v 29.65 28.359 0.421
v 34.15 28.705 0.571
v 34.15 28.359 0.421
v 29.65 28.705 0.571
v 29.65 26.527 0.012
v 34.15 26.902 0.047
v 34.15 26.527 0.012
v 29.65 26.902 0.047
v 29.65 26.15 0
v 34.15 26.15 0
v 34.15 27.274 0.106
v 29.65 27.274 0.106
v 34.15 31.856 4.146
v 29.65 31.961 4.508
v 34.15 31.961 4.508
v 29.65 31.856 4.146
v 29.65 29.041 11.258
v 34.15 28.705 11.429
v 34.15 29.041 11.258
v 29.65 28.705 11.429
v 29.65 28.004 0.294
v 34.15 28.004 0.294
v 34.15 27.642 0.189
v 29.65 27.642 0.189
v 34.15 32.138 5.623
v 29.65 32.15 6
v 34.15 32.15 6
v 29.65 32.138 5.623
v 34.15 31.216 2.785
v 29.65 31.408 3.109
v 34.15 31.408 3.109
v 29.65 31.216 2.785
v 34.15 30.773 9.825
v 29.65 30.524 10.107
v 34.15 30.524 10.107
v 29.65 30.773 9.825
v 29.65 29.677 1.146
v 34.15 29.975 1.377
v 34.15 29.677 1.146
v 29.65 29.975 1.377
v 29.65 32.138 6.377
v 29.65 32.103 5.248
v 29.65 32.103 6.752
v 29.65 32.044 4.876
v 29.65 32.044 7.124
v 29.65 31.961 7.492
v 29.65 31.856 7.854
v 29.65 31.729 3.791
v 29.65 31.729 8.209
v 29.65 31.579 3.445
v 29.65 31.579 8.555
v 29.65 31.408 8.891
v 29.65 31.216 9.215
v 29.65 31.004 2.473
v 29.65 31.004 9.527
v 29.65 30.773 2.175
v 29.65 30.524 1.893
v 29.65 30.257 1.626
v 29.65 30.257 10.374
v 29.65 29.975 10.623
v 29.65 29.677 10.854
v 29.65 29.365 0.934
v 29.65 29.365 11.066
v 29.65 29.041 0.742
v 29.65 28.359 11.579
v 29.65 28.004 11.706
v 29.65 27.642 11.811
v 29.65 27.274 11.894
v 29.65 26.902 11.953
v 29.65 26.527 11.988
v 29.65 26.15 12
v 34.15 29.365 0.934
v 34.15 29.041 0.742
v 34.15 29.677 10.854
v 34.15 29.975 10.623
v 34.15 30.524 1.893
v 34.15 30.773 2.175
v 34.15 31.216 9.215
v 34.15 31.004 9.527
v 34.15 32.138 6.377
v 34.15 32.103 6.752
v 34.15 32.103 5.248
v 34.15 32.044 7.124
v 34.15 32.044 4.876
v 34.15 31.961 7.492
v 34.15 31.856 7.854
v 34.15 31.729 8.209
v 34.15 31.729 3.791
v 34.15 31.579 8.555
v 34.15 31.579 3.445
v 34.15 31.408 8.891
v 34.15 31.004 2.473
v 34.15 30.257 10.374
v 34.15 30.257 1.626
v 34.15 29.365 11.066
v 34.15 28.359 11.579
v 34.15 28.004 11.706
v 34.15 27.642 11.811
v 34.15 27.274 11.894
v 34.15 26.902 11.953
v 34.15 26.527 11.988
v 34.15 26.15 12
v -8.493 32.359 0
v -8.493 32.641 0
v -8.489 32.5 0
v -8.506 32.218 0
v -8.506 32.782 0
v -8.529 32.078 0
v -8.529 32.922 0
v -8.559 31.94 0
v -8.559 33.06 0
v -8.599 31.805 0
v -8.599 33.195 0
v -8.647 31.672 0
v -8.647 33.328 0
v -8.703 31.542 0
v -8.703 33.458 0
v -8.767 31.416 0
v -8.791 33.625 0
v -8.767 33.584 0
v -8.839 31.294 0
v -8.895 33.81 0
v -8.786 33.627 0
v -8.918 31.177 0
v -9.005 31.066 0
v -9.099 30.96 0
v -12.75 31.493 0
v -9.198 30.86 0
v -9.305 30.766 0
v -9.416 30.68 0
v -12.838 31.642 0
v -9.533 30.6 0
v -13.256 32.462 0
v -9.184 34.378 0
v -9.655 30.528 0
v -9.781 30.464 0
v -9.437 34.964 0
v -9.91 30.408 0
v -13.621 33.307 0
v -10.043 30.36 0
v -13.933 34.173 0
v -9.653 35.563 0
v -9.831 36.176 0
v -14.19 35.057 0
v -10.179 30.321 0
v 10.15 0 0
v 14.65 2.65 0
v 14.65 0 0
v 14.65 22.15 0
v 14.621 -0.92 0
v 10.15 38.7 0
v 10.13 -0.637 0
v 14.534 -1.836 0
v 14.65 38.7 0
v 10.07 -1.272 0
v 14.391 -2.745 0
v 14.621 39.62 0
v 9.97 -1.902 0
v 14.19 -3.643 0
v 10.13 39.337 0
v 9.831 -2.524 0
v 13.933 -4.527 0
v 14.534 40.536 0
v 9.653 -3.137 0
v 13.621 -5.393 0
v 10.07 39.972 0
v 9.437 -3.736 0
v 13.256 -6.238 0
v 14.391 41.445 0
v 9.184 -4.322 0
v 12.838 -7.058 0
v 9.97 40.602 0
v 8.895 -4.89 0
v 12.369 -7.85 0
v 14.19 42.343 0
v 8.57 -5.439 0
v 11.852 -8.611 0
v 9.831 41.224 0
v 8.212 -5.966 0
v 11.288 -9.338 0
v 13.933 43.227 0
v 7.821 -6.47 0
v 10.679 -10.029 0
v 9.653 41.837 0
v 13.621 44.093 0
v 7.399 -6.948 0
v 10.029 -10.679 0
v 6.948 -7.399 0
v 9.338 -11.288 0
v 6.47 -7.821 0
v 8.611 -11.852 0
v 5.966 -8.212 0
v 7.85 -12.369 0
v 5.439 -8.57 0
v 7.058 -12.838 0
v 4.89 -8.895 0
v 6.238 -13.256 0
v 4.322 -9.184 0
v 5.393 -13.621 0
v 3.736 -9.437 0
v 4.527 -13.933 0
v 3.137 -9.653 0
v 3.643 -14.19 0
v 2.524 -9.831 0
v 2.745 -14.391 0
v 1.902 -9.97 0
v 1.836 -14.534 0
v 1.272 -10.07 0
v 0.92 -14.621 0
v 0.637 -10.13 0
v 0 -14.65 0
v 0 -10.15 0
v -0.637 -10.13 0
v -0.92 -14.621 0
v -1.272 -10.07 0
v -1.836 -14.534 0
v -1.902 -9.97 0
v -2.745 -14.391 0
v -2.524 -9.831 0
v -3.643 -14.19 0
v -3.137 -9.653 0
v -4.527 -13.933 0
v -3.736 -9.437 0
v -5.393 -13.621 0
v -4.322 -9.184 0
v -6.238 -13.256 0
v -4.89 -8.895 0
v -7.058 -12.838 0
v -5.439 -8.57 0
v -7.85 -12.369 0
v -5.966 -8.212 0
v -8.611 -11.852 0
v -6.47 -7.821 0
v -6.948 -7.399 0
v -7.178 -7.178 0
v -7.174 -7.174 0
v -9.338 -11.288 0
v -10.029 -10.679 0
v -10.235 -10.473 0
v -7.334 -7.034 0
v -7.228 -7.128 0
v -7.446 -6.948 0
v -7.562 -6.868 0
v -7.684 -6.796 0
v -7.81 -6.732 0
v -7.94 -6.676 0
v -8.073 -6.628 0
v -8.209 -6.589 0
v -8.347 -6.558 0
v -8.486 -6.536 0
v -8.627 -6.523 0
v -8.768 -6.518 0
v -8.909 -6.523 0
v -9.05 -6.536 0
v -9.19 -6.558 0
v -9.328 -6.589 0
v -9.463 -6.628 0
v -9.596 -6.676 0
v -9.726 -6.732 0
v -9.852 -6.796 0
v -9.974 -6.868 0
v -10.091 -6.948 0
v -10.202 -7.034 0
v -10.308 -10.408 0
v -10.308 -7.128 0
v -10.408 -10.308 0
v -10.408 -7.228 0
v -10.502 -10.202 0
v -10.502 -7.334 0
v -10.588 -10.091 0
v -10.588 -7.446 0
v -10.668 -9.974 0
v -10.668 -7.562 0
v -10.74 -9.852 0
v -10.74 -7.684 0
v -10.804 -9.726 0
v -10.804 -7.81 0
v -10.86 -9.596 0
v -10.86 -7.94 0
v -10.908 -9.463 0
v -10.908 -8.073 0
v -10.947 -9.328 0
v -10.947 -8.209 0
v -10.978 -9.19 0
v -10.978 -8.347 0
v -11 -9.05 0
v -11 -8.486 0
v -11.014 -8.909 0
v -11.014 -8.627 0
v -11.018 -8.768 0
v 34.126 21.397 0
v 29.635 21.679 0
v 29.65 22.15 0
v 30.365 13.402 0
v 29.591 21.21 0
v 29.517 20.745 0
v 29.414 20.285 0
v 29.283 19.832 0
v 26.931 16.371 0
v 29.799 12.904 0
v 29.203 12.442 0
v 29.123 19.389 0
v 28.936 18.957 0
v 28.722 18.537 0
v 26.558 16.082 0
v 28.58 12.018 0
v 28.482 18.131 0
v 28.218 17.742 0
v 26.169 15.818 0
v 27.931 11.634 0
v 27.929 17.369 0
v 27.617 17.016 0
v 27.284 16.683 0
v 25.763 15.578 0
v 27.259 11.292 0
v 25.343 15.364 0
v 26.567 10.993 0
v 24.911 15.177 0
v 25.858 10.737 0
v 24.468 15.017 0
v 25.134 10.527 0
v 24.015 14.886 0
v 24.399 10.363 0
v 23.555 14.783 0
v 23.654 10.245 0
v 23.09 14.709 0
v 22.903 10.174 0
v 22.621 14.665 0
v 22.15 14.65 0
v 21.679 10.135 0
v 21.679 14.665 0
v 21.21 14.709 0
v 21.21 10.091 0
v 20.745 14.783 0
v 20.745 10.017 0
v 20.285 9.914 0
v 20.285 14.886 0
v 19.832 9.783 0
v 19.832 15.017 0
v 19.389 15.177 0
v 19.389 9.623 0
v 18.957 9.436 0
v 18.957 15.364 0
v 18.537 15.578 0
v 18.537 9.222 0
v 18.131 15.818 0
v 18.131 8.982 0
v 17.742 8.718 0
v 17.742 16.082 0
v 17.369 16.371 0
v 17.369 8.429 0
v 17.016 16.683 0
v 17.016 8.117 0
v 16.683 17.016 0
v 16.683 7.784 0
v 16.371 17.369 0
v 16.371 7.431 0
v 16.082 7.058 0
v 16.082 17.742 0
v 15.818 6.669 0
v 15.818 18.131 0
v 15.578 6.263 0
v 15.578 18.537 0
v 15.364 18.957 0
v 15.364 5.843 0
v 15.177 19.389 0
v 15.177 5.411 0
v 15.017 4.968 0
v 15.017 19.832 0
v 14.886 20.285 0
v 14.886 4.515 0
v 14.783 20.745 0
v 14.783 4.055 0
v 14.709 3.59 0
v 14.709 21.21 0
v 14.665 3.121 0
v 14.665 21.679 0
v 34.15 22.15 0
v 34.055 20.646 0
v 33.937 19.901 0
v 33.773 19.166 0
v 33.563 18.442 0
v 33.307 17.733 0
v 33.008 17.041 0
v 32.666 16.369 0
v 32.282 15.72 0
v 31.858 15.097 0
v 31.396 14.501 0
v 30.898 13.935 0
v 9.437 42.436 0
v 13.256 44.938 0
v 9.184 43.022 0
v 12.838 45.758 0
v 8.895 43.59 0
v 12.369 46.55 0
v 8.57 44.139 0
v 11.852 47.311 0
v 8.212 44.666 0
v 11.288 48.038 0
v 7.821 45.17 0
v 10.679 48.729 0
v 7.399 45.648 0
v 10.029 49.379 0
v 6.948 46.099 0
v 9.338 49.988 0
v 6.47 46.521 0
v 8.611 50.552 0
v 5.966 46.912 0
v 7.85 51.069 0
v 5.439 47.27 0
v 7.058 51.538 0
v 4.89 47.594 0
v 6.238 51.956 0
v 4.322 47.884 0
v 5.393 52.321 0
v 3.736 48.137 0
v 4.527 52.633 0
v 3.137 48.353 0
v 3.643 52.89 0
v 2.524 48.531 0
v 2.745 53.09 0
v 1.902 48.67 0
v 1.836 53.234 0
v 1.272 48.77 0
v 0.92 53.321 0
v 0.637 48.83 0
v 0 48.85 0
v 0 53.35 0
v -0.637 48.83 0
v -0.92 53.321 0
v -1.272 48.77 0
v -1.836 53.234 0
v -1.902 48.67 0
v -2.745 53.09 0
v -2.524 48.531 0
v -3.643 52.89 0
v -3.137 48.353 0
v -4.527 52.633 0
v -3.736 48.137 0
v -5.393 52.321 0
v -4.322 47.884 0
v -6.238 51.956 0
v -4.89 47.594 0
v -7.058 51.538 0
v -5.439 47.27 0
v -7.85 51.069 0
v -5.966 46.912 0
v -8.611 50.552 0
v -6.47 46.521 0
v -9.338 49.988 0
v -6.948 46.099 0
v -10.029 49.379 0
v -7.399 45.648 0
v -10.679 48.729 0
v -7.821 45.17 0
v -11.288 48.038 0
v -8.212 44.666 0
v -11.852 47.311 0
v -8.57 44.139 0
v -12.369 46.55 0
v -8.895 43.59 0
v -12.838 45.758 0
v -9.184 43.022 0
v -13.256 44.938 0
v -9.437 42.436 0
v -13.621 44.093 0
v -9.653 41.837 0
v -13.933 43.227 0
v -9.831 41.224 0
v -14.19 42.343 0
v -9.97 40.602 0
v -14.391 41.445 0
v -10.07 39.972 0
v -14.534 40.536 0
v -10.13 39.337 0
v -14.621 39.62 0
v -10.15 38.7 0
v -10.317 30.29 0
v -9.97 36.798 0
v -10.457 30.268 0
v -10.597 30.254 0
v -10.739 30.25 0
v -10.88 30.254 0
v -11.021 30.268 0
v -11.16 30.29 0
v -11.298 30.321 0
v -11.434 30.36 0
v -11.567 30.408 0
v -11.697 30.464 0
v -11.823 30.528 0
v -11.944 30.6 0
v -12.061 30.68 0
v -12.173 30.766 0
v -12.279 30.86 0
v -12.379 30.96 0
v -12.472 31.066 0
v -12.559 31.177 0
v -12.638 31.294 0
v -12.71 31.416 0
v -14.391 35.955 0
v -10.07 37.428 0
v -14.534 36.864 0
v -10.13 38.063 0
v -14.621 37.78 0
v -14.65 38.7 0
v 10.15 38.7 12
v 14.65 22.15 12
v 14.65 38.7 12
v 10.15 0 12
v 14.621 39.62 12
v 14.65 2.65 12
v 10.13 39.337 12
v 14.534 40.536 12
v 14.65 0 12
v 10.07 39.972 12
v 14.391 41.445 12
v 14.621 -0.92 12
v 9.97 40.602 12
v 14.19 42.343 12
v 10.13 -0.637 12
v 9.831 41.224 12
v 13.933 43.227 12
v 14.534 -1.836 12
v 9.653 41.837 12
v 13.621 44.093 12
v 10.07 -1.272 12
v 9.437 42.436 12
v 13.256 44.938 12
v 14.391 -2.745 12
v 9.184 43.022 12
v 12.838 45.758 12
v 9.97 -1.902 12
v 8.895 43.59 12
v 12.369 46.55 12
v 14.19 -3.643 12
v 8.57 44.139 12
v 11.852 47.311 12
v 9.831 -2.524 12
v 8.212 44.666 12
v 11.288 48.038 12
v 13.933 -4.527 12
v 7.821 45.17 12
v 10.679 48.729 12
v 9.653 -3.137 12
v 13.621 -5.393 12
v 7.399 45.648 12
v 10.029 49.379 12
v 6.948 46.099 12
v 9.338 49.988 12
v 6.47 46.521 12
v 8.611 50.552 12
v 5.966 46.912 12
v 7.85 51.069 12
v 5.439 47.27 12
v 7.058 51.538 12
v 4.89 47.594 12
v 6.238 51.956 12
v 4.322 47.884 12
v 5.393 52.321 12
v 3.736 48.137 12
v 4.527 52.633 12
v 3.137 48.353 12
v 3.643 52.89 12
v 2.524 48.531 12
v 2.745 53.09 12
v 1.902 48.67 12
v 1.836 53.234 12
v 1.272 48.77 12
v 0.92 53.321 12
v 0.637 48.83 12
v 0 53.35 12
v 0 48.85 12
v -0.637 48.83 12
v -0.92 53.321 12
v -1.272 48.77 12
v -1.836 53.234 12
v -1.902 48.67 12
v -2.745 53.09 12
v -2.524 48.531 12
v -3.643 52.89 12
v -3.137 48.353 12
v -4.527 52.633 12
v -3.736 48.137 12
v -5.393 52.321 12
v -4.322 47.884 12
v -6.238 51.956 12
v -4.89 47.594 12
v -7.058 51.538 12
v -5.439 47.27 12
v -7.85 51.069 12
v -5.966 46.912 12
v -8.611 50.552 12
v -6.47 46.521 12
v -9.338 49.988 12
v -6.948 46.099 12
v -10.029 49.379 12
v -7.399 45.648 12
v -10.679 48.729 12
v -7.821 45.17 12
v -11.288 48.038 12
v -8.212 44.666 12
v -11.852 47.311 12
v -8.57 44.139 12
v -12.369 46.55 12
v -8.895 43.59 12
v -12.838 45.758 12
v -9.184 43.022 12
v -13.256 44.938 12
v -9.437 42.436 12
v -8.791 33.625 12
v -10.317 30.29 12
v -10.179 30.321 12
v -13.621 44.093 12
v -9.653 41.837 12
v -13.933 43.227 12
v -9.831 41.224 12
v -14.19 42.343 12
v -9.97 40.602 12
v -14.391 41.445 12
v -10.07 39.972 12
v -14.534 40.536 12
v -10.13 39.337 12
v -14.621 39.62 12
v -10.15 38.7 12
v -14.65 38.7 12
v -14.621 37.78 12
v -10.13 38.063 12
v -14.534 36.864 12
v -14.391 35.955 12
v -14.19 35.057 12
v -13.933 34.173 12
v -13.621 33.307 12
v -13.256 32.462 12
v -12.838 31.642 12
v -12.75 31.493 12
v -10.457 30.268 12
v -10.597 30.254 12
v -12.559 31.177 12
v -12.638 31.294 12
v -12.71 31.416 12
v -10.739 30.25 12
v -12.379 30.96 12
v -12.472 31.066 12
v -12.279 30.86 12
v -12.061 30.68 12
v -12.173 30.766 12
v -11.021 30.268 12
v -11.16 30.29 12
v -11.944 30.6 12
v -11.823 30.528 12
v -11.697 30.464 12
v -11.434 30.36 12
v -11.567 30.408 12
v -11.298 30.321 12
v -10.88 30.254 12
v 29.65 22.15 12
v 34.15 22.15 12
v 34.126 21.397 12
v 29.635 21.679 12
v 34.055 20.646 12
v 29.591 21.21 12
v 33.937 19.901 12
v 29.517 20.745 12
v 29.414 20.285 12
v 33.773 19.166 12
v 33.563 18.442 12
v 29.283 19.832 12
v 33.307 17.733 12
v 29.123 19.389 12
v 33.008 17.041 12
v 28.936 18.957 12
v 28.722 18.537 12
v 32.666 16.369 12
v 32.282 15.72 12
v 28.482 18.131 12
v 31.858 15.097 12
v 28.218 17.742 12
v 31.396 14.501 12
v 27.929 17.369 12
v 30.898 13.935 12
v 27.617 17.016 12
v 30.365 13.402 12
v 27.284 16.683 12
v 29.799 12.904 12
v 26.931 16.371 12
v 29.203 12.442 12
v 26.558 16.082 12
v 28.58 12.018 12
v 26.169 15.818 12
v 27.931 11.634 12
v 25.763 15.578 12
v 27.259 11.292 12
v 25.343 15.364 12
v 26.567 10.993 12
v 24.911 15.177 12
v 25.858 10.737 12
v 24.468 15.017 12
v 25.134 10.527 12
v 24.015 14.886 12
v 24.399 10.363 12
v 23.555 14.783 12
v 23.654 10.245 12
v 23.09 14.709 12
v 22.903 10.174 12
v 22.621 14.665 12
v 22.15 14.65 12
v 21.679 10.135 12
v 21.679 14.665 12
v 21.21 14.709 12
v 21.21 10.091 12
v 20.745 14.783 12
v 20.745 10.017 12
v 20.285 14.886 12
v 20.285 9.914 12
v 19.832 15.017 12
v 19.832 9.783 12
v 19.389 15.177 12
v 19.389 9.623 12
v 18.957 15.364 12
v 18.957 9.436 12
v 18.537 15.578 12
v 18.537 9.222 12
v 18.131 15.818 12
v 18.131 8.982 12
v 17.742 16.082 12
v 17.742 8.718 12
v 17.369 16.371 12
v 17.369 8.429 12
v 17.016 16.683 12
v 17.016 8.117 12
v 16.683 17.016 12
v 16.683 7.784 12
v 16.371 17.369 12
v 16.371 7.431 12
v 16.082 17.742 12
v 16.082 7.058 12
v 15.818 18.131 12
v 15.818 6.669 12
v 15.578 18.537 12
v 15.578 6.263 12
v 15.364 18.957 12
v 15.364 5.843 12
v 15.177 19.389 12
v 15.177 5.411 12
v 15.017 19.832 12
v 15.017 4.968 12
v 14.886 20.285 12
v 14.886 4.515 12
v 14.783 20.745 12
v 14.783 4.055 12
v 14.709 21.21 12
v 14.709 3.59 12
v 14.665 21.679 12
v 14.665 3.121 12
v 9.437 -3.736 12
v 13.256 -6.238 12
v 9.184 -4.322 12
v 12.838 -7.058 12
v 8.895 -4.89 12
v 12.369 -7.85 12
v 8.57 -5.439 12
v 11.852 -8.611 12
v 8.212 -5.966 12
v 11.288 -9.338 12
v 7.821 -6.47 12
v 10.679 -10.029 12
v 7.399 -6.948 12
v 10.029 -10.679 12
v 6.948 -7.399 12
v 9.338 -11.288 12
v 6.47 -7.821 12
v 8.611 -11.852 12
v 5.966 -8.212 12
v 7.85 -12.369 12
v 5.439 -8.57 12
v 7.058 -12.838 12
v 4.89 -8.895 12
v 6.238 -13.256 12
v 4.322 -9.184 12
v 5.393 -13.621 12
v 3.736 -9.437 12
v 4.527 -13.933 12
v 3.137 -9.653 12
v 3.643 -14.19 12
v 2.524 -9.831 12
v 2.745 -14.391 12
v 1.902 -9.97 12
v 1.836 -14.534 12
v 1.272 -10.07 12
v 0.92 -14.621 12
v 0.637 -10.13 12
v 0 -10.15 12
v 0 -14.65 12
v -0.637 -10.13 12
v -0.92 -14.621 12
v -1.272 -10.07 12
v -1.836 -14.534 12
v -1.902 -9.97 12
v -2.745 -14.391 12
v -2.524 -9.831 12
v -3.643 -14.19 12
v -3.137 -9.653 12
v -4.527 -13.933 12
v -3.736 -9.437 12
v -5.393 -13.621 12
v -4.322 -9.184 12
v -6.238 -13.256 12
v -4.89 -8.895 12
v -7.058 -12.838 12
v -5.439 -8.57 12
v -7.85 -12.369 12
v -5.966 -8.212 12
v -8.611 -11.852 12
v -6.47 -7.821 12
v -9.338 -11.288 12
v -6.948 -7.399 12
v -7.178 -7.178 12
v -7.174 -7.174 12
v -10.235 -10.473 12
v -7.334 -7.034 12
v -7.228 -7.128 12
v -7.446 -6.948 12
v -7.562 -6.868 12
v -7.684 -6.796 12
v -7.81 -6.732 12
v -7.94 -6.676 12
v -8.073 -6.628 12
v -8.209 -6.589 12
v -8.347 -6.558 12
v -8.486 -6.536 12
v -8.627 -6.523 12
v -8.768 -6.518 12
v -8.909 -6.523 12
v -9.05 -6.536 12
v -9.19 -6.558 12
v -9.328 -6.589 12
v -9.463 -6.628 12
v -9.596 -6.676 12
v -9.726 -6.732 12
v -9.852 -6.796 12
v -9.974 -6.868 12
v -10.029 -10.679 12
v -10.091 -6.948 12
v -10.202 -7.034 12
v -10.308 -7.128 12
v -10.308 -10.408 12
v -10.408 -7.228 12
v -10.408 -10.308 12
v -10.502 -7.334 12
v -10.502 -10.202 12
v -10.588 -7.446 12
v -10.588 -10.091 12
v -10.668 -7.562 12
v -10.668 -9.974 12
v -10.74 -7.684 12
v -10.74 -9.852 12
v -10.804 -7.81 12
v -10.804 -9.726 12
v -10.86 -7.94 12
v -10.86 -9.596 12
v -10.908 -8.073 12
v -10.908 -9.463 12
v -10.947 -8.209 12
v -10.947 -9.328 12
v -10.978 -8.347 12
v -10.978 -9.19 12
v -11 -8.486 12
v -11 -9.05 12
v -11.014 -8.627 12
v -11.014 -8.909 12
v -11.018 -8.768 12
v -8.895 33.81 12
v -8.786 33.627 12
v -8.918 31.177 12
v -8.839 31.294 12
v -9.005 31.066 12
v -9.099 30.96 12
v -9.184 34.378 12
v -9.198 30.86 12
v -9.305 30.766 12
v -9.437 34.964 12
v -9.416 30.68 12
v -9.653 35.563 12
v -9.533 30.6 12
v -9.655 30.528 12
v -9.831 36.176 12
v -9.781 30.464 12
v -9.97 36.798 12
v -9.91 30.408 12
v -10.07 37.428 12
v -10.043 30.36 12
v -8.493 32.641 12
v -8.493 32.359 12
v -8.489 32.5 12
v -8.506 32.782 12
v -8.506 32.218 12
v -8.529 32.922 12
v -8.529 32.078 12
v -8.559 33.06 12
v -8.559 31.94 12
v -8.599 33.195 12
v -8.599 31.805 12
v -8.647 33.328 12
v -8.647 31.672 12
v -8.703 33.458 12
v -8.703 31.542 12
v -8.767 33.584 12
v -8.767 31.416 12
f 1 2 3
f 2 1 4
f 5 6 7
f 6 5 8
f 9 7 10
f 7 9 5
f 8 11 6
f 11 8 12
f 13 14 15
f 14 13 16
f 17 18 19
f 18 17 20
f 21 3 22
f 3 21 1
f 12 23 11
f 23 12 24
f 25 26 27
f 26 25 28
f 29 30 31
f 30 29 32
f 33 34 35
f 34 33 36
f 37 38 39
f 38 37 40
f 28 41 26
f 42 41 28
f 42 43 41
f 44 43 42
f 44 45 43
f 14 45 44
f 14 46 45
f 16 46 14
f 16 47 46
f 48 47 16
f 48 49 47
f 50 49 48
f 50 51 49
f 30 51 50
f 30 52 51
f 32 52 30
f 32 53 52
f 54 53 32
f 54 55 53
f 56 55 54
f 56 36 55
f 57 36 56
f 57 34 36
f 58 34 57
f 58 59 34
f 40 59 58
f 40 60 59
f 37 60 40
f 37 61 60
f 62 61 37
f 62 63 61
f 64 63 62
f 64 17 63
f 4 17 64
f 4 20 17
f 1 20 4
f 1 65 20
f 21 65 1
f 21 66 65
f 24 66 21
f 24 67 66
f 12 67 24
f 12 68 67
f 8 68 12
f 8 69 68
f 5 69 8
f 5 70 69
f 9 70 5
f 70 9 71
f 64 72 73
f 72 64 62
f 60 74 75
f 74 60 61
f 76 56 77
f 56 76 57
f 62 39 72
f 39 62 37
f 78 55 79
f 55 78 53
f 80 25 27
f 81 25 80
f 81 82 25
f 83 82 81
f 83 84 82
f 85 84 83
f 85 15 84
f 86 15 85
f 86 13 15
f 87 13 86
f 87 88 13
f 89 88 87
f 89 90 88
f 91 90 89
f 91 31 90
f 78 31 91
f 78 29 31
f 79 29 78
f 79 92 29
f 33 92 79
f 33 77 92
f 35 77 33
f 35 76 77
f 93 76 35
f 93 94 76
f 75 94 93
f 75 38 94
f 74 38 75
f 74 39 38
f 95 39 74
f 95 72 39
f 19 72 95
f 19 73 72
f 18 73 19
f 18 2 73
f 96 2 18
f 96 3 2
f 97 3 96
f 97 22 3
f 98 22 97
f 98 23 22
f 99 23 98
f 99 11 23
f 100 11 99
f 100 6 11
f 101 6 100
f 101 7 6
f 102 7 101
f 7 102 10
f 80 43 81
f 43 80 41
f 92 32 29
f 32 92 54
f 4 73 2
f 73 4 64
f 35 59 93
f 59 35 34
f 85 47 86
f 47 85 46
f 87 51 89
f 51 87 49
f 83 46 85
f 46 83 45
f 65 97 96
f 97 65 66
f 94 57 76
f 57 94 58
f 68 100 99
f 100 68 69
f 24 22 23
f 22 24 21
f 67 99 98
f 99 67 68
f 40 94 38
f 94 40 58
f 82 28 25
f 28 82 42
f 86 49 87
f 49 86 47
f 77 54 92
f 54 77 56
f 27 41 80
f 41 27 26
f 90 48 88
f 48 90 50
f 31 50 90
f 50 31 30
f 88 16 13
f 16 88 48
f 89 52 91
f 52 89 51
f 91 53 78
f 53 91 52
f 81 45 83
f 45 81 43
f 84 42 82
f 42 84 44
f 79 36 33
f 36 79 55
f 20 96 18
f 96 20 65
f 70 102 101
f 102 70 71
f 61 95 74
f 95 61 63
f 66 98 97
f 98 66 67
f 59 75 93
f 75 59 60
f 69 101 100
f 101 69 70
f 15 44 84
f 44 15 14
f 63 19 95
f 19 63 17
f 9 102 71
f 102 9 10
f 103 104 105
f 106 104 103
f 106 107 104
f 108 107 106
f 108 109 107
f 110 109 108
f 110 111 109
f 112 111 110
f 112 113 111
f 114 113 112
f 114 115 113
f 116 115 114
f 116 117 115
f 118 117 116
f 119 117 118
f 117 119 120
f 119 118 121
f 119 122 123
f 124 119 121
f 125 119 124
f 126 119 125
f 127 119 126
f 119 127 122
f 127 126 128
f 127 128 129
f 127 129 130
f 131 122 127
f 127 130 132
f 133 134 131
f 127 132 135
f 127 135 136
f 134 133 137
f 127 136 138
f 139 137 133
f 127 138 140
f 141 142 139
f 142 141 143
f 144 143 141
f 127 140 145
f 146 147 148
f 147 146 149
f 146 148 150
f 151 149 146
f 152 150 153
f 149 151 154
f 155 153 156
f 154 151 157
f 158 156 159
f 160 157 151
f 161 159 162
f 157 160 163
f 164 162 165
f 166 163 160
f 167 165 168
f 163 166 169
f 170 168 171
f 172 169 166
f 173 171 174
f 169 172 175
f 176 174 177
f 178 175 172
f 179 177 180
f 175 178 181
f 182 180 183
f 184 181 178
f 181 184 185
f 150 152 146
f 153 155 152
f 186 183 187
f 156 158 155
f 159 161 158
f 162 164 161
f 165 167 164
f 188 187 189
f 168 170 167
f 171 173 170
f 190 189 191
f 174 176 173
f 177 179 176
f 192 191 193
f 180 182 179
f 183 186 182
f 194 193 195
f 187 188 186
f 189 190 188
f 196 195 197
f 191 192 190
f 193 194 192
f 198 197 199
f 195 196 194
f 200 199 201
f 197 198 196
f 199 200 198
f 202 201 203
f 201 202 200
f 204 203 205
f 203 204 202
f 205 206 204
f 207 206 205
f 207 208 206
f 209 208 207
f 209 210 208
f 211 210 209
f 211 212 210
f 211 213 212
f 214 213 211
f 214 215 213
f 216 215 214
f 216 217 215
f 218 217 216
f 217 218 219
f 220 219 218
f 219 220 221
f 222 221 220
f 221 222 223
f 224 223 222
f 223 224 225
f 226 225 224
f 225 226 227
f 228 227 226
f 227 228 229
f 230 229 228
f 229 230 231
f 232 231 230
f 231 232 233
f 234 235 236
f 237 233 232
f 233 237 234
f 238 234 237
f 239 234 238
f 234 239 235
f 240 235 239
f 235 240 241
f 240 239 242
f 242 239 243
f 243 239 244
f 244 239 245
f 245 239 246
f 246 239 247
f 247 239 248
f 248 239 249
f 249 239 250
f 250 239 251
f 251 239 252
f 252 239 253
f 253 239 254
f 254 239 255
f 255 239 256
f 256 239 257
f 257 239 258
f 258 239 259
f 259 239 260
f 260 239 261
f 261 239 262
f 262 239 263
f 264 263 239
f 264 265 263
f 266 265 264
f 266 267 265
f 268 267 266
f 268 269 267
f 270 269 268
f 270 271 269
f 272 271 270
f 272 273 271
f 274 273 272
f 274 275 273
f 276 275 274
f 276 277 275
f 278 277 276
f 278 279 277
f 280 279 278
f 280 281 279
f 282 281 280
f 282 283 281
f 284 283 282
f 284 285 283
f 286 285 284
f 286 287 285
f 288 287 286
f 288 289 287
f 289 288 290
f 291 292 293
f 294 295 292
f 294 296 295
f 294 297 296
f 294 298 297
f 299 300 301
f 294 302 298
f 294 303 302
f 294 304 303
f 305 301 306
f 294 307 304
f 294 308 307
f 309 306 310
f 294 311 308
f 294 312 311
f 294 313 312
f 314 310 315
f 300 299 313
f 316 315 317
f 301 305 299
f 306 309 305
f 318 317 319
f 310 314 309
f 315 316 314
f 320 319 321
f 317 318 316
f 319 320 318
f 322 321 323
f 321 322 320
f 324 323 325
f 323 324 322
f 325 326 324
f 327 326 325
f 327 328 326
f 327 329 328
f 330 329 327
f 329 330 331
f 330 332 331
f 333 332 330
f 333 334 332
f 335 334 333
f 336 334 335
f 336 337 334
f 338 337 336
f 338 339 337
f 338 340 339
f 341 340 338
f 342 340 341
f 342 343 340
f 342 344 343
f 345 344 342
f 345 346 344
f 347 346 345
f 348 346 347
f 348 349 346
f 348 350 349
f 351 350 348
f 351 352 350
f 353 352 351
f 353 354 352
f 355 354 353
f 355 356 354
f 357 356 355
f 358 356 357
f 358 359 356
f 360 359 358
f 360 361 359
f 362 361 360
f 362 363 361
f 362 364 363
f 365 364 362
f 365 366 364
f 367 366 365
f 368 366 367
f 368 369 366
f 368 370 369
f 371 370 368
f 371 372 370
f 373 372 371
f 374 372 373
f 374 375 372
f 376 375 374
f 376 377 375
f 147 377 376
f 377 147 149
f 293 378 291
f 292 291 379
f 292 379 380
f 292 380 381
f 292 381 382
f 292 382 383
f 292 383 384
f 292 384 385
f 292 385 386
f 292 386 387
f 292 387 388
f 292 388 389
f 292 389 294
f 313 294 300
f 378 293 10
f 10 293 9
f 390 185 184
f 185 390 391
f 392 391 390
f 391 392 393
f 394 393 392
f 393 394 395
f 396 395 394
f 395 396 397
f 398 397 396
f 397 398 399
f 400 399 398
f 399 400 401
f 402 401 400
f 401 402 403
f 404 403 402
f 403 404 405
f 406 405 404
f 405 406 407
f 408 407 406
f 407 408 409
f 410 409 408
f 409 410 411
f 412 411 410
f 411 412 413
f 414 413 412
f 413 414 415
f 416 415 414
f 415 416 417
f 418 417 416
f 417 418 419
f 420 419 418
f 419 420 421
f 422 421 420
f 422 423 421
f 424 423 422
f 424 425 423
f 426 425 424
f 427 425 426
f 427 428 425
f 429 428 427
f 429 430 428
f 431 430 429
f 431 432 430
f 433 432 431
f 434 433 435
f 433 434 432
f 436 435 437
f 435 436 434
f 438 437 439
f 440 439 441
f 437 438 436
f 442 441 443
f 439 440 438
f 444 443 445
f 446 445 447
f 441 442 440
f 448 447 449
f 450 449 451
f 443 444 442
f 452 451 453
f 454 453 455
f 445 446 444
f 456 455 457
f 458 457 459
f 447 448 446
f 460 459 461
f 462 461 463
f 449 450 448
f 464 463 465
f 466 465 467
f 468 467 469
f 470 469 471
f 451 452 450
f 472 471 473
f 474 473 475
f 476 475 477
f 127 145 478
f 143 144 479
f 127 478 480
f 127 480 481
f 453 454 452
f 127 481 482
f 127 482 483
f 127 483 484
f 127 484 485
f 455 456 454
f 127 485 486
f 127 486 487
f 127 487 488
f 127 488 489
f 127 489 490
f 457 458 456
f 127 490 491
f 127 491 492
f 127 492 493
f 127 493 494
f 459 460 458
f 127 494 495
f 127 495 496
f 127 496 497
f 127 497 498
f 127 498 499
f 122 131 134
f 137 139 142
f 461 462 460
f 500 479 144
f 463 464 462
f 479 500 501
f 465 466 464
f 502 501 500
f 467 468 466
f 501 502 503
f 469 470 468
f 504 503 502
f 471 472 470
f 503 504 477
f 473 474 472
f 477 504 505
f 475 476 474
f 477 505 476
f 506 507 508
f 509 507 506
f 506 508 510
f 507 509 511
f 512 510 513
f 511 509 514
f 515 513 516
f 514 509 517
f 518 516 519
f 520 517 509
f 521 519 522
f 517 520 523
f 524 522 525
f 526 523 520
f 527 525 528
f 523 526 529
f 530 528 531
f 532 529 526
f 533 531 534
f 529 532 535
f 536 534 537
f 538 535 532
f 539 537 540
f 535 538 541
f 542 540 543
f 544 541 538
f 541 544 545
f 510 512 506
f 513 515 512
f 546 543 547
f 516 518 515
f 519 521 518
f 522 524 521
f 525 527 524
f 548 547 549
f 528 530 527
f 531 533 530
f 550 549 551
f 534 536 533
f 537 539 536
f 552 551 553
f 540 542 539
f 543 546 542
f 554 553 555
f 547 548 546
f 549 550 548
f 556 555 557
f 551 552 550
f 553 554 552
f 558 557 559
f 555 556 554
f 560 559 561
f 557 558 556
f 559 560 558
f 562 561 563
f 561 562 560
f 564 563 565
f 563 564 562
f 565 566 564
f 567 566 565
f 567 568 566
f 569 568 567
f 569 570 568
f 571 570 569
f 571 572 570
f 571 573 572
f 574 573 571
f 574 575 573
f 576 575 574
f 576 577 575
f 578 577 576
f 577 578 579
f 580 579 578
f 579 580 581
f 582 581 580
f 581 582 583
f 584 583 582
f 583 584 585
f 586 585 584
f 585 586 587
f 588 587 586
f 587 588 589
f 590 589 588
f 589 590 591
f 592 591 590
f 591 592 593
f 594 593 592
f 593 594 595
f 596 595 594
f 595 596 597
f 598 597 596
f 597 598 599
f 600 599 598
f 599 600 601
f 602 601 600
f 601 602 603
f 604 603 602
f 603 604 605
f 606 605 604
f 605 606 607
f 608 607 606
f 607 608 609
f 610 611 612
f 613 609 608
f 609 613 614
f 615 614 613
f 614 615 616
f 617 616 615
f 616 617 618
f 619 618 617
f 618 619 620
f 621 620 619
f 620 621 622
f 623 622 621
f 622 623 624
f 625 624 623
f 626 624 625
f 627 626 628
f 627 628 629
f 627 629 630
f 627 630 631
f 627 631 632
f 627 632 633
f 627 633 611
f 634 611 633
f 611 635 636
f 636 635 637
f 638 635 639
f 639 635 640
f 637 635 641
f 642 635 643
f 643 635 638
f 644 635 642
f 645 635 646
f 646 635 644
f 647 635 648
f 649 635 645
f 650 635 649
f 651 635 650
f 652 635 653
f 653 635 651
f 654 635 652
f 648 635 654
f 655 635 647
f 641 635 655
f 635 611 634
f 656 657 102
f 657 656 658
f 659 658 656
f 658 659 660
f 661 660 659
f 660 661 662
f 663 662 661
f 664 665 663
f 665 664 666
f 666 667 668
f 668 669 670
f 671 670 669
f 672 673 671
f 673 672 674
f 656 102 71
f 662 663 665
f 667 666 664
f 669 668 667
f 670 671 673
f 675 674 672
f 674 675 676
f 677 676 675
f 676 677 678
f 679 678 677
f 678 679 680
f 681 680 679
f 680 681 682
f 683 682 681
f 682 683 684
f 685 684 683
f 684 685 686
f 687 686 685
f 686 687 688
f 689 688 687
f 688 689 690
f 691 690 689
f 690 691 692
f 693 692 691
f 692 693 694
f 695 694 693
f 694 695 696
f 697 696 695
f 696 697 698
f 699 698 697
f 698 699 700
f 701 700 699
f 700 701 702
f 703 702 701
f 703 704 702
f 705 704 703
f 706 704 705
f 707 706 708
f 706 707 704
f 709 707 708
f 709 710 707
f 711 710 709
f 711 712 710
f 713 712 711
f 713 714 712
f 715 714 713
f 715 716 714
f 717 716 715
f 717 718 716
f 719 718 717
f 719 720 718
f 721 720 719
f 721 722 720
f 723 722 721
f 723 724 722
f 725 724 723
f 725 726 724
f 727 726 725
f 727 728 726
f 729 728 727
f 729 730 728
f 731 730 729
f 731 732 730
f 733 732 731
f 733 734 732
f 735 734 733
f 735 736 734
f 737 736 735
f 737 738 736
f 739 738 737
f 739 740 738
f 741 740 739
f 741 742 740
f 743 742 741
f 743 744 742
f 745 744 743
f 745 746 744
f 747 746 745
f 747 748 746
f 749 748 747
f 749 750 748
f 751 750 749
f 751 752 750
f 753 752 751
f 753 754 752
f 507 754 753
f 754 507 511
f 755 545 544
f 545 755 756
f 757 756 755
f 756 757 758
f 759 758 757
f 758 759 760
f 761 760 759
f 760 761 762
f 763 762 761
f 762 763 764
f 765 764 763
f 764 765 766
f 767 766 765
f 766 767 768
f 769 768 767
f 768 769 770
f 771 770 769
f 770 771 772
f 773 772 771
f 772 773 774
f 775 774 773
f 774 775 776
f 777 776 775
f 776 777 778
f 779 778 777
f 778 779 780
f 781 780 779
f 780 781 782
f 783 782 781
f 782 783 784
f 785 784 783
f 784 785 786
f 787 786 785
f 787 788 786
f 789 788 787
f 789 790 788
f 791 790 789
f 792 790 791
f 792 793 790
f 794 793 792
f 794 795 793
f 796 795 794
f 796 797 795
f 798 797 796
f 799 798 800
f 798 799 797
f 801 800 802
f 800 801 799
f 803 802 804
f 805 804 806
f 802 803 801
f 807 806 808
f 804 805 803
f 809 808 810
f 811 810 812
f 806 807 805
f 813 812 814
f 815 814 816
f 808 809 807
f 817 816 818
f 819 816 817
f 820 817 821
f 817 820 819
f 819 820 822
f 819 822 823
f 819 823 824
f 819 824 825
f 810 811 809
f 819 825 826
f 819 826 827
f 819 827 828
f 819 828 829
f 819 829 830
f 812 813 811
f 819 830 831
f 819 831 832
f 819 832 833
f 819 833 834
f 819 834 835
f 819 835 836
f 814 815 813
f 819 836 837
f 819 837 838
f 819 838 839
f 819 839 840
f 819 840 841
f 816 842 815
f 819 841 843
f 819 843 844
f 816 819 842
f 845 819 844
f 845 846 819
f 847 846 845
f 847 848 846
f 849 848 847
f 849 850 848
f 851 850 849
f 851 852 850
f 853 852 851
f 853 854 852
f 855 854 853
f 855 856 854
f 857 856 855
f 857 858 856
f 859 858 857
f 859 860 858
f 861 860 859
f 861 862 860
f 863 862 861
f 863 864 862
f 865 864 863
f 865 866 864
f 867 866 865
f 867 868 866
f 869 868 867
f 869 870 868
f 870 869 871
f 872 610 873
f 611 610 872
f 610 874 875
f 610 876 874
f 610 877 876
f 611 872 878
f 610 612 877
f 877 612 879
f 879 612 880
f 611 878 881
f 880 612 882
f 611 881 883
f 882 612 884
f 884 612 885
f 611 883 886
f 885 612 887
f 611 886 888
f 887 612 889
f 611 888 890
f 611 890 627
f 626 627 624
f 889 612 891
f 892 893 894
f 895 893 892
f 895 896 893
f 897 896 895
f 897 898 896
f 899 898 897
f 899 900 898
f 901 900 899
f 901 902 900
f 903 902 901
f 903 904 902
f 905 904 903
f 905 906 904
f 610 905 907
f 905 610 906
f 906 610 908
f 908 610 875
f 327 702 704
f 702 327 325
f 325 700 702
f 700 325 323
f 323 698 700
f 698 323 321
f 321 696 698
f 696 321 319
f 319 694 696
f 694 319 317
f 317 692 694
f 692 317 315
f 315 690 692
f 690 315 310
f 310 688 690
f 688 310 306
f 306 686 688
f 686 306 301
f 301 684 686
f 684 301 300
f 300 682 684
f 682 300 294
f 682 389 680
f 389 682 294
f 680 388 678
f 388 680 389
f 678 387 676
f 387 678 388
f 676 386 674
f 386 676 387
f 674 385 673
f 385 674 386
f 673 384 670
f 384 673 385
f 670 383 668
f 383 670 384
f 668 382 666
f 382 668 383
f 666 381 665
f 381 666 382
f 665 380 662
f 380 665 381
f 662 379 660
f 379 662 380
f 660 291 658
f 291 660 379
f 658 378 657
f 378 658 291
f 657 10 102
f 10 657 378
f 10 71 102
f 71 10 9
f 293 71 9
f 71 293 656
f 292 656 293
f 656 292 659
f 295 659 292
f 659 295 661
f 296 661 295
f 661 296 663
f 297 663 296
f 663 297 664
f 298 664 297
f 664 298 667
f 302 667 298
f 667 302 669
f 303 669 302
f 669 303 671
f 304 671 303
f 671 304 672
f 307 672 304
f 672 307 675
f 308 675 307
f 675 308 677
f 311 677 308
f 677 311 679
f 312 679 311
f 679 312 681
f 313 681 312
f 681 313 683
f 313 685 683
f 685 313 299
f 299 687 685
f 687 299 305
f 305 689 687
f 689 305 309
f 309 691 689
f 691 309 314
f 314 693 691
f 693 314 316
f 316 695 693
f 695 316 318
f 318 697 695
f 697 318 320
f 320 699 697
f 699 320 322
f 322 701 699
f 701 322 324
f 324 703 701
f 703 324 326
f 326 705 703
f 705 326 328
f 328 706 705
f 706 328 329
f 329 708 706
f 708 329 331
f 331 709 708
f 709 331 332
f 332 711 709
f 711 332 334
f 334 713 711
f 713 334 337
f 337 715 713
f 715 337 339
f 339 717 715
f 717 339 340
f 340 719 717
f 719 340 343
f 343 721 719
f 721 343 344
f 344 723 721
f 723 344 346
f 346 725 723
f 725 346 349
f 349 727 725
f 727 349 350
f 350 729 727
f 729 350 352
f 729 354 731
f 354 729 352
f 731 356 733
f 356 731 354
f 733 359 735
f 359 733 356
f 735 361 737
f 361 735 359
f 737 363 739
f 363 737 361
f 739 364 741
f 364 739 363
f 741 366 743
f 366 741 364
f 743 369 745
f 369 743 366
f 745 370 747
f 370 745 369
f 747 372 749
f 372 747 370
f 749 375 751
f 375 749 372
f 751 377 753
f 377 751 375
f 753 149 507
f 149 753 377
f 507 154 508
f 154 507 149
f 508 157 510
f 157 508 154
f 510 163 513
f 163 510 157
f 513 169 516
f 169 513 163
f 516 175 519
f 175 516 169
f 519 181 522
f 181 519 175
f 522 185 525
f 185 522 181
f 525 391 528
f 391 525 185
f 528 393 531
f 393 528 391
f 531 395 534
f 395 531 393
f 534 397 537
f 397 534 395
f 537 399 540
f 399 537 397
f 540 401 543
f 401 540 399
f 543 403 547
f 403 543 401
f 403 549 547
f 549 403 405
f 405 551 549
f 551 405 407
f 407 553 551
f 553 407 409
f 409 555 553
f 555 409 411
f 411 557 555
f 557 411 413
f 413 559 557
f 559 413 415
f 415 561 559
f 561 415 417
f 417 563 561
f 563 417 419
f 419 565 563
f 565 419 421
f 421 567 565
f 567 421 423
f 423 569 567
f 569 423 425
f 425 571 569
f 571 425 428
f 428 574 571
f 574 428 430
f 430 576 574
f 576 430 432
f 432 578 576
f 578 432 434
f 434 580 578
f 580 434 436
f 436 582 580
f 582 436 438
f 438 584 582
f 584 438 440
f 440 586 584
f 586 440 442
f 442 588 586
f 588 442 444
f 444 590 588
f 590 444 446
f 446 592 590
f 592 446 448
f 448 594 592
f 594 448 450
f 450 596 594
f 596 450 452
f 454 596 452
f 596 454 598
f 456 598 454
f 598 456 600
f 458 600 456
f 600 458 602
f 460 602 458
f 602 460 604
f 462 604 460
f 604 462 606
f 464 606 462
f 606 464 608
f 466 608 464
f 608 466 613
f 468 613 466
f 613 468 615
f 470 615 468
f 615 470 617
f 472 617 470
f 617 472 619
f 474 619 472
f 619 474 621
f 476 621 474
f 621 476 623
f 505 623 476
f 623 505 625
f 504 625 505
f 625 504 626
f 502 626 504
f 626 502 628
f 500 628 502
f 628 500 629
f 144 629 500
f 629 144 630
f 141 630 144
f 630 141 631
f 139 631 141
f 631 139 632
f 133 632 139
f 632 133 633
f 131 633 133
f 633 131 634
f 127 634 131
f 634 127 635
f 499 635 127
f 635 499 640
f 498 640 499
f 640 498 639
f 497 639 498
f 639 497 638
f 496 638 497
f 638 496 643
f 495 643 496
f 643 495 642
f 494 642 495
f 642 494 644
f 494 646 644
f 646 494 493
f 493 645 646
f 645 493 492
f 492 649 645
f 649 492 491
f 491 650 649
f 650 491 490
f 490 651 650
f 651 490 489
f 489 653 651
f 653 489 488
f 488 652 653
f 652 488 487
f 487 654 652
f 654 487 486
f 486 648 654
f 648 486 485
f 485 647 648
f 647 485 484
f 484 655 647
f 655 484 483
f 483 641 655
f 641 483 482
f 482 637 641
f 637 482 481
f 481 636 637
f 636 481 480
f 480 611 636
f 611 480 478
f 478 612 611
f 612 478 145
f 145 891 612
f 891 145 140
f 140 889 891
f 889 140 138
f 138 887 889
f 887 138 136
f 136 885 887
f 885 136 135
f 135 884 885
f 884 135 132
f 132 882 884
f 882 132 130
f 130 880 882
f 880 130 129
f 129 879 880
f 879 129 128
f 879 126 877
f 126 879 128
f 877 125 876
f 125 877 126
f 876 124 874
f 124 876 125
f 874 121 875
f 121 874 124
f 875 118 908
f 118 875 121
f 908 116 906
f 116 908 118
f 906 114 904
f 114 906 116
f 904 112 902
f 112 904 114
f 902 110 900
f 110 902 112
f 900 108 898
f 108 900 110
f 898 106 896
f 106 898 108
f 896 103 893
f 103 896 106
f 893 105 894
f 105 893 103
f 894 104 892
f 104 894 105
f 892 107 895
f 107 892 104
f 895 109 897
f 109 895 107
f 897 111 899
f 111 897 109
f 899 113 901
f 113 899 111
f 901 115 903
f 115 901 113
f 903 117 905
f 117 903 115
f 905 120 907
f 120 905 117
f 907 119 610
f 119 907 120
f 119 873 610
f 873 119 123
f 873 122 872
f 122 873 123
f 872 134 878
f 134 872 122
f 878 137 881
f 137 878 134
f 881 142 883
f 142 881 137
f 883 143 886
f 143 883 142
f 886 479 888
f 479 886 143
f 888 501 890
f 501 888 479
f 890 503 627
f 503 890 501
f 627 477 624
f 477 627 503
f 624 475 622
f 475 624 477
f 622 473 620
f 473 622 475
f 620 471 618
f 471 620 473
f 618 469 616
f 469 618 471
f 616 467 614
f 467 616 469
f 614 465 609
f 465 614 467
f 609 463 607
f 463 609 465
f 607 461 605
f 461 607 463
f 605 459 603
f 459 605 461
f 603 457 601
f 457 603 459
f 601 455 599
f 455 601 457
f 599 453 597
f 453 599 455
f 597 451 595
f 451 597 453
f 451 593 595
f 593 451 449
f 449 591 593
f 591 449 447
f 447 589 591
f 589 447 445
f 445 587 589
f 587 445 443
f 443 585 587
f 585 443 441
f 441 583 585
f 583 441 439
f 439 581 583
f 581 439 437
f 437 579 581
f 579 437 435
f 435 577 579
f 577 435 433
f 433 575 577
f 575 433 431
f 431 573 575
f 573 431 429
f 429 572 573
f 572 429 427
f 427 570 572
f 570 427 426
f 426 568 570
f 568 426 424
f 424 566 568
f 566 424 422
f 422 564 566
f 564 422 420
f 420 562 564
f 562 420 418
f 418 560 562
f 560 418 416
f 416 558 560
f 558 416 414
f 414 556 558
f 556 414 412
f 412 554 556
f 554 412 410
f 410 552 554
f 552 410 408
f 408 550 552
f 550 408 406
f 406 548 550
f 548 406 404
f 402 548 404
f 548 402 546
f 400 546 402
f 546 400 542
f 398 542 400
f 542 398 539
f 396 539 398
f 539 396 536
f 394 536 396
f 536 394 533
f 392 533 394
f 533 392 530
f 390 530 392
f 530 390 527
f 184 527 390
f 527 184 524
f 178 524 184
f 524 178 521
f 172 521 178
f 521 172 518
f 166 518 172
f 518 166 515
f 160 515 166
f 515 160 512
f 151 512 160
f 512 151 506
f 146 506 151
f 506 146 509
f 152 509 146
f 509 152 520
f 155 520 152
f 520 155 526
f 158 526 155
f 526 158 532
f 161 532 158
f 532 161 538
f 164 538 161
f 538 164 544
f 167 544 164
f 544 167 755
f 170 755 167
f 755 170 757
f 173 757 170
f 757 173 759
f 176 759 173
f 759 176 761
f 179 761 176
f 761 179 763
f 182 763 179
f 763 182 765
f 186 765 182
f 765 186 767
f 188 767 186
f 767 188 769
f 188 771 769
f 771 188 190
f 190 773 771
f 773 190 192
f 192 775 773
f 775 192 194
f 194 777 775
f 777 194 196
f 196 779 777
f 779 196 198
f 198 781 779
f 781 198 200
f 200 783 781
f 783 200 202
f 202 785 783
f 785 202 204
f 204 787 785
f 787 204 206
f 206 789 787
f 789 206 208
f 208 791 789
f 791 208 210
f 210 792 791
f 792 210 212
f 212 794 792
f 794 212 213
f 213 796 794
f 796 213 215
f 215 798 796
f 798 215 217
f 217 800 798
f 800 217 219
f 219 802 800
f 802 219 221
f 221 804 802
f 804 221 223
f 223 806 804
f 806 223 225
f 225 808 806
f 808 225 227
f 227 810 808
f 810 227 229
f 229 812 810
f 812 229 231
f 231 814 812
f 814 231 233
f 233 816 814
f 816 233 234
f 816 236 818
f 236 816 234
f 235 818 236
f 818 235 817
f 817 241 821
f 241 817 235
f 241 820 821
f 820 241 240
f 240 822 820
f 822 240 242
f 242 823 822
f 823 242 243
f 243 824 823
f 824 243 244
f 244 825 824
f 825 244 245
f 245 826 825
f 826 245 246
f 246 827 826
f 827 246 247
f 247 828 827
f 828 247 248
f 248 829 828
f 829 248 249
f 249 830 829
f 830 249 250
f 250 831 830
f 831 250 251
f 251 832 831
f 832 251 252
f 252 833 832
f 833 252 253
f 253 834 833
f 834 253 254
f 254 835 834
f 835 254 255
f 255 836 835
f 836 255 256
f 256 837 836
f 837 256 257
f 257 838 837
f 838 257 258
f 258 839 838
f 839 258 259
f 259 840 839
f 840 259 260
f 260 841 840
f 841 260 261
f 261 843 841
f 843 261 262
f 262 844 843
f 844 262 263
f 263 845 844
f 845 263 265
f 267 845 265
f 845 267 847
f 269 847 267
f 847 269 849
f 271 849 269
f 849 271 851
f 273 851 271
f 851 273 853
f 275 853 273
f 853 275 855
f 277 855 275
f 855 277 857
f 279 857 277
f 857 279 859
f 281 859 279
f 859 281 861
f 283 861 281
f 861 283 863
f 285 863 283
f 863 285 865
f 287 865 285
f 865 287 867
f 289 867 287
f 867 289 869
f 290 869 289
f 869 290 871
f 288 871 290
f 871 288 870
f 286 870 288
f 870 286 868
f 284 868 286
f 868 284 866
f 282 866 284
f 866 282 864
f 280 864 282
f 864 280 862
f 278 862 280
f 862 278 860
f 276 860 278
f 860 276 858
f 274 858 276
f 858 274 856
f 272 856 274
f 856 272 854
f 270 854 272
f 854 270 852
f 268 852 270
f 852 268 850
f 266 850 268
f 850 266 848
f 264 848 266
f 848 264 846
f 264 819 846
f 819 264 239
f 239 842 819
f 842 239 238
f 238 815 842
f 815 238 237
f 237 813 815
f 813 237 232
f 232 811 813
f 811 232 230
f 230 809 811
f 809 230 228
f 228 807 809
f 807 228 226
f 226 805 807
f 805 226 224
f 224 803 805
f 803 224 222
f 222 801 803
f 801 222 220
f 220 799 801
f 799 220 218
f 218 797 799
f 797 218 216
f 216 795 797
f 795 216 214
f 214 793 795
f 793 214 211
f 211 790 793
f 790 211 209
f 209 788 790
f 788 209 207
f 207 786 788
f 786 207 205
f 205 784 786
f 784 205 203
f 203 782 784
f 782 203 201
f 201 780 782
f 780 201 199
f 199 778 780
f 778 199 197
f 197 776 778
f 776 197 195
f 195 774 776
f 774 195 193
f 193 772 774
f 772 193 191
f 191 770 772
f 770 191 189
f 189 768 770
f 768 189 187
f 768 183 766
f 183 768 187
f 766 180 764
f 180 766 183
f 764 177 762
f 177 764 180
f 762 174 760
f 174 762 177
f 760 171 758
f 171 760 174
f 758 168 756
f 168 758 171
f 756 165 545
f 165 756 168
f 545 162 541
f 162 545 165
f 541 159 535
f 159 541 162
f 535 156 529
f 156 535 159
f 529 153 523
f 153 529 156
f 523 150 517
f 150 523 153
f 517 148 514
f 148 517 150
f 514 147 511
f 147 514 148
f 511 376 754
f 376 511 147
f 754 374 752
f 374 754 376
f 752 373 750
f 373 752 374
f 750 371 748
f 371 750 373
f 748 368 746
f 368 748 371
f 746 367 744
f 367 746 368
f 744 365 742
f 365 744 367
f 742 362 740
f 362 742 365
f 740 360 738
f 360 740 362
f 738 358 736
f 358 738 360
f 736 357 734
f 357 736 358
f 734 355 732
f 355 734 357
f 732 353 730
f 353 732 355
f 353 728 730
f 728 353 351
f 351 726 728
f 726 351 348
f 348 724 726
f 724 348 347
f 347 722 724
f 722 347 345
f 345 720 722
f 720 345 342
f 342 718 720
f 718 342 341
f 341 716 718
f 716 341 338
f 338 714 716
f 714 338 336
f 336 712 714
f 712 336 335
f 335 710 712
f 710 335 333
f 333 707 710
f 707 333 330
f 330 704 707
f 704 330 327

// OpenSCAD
diameter=20.3; // to measure: bar diameter
distance=20.3 + 19.7 + 20.3 - 1.3; // to measure: distance between the bars (including bars)
  // Use 1-1.5 mm less than the measured distance to give the mounted hook some pre-tension.
  // This prevents wiggling around one end left and right, even for a narrow hook.

thickness=4.5; // wall thickness
space_h=15; // front hook distance
shift_h=0.5*diameter + thickness + 0.5*space_h; // front hook shift, 
   // calculated to make the front hook occupy the space between the tubes
height_h=10; // front hook height
alpha_t=210; // top hook angle
alpha_b=135; // bottom hook angle
radius_r=7.5; // rounding radius
$fn=100;
width=12.0; // width of the hook

radius_b=diameter/2;
distance_b=distance-2*radius_b;
radius_h=space_h/2;

module part_square(p_size,p_alpha) {
if (p_alpha < 0)
    mirror([0,1]) part_square(p_size,-p_alpha);
else if (p_alpha > 360)
    part_square(p_size,p_alpha-360);
else if (p_alpha > 180) {
        translate([-p_size,0]) square([2*p_size,p_size]);
        rotate(180) part_square(p_size,p_alpha-180);
    }
else if (p_alpha > 90) {
        square([p_size,p_size]);
        rotate(90) part_square(p_size,p_alpha-90);
    }
else if (p_alpha > 45)
    difference() {
        square([p_size,p_size]);
        mirror([1,-1]) part_square(p_size,90-p_alpha);
    }
else
    polygon([[0,0],[p_size,0],[p_size,tan(p_alpha)*p_size]]);
}

module part_ring(p_radius,p_thickness,p_alpha) {
    p_length=p_radius+p_thickness;
    intersection() {
        difference() {
            circle(p_length);
            circle(p_radius);
        }
        part_square(p_length,p_alpha);
    }
}

function vector(p_radius,p_alpha) = [p_radius*cos(p_alpha),p_radius*sin(p_alpha)];

function circle_intersection(c1,r1,c2,r2) = 
let( x1=c1[0], y1=c1[1], x2=c2[0], y2=c2[1],
x0=x2-x1,                                      // difference in x coordinates
y0=y2-y1,                                      // difference in y coordinates
r=sqrt(pow(x0,2)+pow(y0,2)),                   // distance between centers
m1=(pow(r,2)+pow(r1,2)-pow(r2,2))/2/r,         // distance from center 1 to line
m2=sqrt(pow(r1,2)-pow(m1,2)))
   [x1+x0*m1/r+y0*m2/r,y1+y0*m1/r-x0*m2/r];    // right point
// [x1+x0*m1/r-y0*m2/r,y1+y0*m1/r+x0*m2/r];    // left point

module circle_2(p1,p2,c1,r1,c2,r2) {
    difference() {
        polygon([p1,p2,c1,c2]);
        translate(c1) circle(r1);
        translate(c2) circle(r2);
    }
}

module circle_3(c1,r1,c2,r2,c3,r3) {
    difference() {
        polygon([c1,[c1[0]+r1,c1[1]],[c2[0]-r2,c2[1]],c2,c3]);
        translate(c1) circle(r1);
        translate(c2) circle(r2);
        translate(c3) circle(r3);
    }
}

r_thickness=thickness/2;
r_length_b=radius_b+r_thickness;
r_length_h=radius_h+r_thickness;
v_center=circle_intersection(
    [0,0],radius_b+thickness+radius_r,
    [radius_b+radius_h+thickness,shift_h],radius_h+thickness+radius_r
);
y1_center=sqrt(4*radius_h*radius_r+thickness*(2*radius_h+2*radius_r+thickness));
y2_center=sqrt(4*radius_b*radius_r+thickness*(2*radius_b+2*radius_r+thickness));

linear_extrude(width){
    // Upper radiator tube clamp.
    translate([0,distance_b]) {
        part_ring(radius_b,thickness,alpha_t);
        translate(vector(radius_b+r_thickness,alpha_t)) circle(r_thickness);
    }
    
    // Vertical, straight part of the clamp.
    translate([radius_b,0]) square([thickness,max(distance_b,shift_h)]);
    
    if (shift_h < 0)
        translate([radius_b,0]) mirror([0,1]) square([thickness,-shift_h]);
    
    // Lower radiator tube clamp.
    part_ring(radius_b,thickness,-alpha_b);
    
    // Tip rounding of the lower end.
    translate(vector(radius_b+r_thickness,-alpha_b)) circle(r_thickness);
    
    // Rounded part of the hook.
    translate([radius_b+radius_h+thickness,shift_h]) rotate(180)
        part_ring(radius_h,thickness,180);
    
    // Vertical part of the hook.
    translate([radius_b+2*radius_h+thickness,shift_h]) square([thickness,height_h-0.5*width]);
    
    // Original tip rounding of the hook. Here replaced by rounding in the yz-plane.
    //translate([radius_b+2*radius_h+3*r_thickness,shift_h+height_h]) circle(r_thickness);

    // Radius to support the hook at the bottom.
    if (shift_h > radius_h+thickness+radius_r)
        circle_2 (
            [radius_b+thickness,shift_h-y1_center],
            [radius_b+thickness,shift_h],
            [radius_b+radius_h+thickness,shift_h],radius_h+thickness,
            [radius_b+radius_r+thickness,shift_h-y1_center],radius_r
        );
    else if (-shift_h > radius_b+thickness+radius_r)
        circle_2 (
            [radius_b,-y2_center],
            [radius_b,0],
            [0,0],radius_b+thickness,
            [radius_b-radius_r,-y2_center],radius_r
        );
    else
        circle_3 (
            [0,0],radius_b+thickness,
            [radius_b+radius_h+thickness,shift_h],radius_h+thickness,
            v_center,radius_r
        );
}

translate([radius_b+2*radius_h+3*r_thickness, shift_h+height_h-0.5*width, 0.5*width])
    rotate([0, 90, 0])
        difference() {
            cylinder(h = thickness, r = 0.5*width, center = true);
            translate([0, -0.25*width, 0]) cube([width, 0.5*width, thickness + 0.01], center = true);
        }
